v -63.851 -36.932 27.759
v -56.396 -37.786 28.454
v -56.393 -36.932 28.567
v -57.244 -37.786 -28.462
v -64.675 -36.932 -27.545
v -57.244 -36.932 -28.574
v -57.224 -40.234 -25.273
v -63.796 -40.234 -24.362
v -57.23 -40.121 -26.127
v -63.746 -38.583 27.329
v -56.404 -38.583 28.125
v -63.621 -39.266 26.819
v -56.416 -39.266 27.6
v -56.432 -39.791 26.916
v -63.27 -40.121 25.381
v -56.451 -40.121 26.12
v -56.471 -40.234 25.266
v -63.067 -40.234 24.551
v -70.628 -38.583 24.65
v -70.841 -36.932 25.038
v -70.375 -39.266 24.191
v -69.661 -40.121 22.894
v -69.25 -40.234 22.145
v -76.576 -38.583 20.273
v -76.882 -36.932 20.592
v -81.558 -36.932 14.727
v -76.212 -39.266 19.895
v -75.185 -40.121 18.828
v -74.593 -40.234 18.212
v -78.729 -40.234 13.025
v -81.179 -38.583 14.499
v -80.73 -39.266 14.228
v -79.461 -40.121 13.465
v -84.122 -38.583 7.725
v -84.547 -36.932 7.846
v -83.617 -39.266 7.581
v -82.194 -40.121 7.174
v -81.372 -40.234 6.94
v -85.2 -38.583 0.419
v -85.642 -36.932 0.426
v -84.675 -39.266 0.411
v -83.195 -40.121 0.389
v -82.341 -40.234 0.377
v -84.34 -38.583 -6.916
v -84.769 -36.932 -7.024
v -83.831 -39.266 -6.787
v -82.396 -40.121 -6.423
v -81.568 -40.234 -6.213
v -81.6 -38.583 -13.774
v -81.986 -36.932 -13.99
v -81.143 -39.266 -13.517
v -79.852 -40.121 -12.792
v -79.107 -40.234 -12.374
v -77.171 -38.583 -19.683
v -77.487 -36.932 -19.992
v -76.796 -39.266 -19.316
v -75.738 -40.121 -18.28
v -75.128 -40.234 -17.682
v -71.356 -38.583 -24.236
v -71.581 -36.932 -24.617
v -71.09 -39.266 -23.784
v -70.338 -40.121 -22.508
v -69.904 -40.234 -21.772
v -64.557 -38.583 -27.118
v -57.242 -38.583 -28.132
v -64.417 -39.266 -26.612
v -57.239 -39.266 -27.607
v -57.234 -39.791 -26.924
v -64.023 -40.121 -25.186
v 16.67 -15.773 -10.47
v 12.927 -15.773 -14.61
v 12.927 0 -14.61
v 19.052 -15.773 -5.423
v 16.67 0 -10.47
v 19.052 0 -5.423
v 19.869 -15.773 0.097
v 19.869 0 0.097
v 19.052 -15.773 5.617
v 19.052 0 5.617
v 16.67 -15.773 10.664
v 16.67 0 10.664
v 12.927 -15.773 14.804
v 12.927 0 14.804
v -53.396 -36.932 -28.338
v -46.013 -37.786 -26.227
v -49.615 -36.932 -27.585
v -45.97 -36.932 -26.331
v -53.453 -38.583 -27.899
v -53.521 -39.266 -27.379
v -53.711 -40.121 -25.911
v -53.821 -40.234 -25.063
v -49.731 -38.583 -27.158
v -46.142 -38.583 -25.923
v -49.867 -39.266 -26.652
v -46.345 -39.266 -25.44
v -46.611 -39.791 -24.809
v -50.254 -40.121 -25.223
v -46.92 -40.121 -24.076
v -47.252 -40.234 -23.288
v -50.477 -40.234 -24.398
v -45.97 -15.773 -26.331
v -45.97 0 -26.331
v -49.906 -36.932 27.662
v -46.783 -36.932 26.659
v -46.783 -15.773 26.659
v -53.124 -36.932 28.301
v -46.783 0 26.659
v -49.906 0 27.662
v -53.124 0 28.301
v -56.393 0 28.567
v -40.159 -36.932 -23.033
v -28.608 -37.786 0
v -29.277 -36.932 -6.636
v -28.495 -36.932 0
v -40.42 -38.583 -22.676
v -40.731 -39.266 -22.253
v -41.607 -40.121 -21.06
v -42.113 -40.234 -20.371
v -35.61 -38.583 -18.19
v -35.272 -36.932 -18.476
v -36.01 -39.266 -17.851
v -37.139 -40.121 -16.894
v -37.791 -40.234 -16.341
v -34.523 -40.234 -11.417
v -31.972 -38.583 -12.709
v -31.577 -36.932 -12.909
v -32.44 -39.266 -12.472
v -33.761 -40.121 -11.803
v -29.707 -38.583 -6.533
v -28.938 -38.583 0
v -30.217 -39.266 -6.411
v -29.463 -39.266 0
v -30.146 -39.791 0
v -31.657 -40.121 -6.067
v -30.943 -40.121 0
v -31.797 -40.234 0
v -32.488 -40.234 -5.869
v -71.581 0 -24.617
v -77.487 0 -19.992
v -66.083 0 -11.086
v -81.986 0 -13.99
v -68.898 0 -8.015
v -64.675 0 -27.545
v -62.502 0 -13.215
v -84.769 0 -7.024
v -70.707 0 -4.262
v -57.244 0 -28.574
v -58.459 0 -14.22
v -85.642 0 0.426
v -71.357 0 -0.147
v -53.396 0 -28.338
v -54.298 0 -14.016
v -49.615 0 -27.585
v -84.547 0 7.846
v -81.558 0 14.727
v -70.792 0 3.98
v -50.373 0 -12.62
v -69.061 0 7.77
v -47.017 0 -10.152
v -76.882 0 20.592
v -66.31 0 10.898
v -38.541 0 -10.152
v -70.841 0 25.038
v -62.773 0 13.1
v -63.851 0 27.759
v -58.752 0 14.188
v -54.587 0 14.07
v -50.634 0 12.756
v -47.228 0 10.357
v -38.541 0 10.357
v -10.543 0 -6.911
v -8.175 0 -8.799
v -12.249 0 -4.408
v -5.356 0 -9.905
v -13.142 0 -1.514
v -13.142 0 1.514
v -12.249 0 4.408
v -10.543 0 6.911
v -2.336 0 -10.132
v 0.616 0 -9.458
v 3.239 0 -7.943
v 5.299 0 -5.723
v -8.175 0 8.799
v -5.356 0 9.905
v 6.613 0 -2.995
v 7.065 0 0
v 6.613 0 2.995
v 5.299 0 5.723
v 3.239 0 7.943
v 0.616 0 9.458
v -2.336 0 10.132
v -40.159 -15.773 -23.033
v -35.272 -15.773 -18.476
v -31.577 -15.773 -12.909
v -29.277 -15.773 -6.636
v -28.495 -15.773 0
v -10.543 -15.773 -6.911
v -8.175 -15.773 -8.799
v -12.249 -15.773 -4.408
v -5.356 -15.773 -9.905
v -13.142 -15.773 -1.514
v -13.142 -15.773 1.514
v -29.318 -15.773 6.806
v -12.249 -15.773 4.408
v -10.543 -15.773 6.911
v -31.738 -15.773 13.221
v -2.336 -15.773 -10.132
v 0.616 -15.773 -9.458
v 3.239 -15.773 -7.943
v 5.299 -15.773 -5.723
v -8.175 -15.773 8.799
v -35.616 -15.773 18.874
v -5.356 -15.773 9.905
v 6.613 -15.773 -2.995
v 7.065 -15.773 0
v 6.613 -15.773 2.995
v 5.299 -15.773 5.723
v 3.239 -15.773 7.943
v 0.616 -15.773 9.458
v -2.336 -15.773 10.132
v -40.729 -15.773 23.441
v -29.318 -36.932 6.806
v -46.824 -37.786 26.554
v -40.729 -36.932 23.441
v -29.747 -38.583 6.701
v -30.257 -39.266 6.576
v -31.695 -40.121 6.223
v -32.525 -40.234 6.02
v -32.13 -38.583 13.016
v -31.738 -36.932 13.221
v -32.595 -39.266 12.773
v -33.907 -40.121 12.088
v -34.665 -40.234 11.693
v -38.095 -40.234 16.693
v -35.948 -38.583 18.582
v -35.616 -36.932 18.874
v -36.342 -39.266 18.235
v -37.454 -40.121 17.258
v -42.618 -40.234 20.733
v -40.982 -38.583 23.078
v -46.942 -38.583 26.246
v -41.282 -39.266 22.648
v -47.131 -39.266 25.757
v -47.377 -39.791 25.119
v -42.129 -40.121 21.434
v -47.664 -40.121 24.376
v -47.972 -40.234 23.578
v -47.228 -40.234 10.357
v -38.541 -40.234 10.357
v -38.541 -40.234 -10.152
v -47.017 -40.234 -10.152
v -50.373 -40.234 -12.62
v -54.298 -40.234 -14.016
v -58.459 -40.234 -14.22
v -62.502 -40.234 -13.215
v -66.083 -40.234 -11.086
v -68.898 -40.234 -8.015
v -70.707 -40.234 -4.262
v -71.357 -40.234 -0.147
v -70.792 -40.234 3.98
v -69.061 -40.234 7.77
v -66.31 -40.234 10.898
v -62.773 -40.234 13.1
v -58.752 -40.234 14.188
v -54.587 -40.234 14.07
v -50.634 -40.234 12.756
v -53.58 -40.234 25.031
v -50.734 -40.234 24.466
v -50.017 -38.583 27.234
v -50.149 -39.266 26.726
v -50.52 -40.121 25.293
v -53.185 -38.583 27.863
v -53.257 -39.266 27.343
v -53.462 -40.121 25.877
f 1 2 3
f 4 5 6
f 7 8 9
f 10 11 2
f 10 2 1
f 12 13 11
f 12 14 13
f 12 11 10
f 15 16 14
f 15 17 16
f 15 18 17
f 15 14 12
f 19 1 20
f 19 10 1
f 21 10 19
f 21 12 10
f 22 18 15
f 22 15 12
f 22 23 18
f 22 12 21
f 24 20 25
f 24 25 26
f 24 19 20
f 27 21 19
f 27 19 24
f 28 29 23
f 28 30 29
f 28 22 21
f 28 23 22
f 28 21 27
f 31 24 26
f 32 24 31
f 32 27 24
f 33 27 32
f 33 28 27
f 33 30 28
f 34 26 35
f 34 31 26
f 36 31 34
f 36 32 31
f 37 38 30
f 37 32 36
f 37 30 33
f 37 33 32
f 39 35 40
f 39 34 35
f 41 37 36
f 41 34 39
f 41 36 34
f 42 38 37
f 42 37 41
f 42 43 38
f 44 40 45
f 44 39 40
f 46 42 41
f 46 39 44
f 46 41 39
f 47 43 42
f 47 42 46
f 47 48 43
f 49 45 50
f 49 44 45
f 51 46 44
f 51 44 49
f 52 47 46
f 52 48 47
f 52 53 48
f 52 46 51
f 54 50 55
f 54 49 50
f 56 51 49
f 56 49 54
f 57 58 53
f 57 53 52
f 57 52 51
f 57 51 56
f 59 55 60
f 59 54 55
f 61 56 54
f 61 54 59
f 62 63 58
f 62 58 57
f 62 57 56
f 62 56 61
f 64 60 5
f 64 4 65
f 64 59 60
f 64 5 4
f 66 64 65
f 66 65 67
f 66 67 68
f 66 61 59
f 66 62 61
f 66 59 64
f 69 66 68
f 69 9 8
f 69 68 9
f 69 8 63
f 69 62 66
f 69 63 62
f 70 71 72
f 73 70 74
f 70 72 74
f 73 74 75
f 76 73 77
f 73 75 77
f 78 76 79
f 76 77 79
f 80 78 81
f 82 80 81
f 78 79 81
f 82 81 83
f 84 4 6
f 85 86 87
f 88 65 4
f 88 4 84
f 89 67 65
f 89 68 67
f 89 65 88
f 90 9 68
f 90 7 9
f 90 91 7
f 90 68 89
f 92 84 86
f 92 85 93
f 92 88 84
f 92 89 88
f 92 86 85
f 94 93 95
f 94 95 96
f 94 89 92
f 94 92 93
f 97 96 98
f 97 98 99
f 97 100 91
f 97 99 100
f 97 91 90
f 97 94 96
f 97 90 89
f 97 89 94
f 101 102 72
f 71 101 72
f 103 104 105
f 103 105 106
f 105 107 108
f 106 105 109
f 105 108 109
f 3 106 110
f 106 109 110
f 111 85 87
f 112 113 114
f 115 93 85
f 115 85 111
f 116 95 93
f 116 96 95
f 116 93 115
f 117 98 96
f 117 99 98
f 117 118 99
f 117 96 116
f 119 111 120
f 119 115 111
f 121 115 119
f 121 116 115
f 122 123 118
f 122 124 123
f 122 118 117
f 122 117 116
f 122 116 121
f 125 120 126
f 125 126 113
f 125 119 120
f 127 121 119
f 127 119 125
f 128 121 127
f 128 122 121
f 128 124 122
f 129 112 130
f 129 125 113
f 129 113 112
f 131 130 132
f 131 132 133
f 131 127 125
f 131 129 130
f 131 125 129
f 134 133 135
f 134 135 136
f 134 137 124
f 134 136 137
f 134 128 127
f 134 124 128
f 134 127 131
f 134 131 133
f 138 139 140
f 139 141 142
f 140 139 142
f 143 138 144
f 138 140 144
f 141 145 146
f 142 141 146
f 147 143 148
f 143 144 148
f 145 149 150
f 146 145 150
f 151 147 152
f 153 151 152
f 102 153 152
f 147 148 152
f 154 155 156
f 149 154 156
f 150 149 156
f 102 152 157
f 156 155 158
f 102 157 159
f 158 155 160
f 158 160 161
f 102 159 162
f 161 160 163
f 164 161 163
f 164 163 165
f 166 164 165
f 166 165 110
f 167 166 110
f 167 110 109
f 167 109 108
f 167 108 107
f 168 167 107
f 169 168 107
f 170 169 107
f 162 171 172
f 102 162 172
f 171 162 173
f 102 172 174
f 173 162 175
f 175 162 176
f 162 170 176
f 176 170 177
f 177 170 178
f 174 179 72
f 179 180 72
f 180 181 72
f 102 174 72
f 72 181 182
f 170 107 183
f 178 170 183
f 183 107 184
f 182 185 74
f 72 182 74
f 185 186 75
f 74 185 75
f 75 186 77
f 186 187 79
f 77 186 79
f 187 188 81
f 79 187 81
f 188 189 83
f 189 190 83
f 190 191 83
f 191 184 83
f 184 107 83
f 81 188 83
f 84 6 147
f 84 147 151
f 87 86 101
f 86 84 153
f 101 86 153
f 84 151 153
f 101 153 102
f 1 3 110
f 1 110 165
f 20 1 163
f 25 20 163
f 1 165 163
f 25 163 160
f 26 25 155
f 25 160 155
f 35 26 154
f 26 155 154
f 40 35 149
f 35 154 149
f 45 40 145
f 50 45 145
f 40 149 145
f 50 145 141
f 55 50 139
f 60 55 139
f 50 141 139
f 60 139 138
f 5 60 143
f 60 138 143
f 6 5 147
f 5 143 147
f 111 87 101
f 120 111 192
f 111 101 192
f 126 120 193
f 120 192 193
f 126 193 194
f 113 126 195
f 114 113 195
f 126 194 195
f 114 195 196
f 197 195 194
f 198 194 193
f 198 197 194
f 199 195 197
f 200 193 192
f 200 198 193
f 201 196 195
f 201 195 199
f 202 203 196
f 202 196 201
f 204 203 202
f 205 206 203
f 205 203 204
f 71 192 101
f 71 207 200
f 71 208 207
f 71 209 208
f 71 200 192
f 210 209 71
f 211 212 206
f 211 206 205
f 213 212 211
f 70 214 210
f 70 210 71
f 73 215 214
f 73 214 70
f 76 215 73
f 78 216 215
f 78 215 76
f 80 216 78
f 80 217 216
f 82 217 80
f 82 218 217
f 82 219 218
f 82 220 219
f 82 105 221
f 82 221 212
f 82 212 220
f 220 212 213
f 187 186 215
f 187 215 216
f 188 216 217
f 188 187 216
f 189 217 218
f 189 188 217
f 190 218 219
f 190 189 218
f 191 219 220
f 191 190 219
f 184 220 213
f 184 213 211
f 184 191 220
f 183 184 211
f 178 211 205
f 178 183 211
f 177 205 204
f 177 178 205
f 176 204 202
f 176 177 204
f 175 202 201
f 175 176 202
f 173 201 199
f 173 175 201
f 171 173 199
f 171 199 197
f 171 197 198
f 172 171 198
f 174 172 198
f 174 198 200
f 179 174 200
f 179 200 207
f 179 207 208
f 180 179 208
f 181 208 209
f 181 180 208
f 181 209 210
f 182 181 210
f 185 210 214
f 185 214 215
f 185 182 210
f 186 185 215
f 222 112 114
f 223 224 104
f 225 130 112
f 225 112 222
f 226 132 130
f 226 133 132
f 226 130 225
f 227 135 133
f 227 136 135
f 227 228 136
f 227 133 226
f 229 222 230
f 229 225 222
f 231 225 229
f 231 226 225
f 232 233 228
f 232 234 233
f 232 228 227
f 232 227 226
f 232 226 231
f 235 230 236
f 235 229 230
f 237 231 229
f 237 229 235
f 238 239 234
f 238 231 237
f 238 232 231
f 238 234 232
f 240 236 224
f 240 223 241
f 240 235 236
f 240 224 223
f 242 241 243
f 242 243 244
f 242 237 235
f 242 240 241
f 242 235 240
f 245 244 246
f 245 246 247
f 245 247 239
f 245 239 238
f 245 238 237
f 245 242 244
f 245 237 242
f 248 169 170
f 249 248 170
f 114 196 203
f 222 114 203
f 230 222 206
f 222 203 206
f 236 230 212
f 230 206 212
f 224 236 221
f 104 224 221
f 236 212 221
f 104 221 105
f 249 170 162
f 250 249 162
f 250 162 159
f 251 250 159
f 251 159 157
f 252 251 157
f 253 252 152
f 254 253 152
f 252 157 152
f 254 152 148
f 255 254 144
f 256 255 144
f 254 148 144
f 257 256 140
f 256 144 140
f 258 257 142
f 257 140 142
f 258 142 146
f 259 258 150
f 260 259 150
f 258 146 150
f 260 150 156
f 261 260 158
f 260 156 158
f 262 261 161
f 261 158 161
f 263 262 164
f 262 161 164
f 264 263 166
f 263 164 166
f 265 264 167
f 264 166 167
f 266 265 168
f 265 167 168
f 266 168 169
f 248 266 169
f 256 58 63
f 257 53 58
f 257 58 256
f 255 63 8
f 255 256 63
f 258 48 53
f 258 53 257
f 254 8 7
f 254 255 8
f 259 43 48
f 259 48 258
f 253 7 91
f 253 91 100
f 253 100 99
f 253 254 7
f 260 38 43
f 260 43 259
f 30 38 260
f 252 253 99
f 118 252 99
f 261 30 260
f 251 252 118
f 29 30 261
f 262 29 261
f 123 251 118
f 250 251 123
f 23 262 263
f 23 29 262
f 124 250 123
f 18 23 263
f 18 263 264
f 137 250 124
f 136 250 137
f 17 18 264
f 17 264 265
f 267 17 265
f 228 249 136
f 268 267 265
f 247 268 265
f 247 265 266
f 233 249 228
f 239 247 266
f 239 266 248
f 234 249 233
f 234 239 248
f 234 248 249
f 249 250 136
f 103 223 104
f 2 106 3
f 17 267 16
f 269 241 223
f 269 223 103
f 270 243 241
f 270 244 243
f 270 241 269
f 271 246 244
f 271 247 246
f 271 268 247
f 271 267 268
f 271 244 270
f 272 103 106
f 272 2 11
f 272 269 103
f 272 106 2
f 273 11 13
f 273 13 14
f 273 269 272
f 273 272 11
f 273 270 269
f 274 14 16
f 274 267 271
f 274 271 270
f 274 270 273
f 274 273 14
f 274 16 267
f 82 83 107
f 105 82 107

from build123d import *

# Parameters (mm, degrees)
F1_DEPTH = 40.2336
F0_R     = 10.16
F2_DEPTH = 15.7734
F3_R     = 3.302


with BuildPart() as f1:
    # F0 (on Front) → F1 (new body)
    with BuildSketch(Plane.XZ):
        with BuildLine():
            ThreePointArc((-46.7830288695, 26.6589681412), (-51.5056559342, 28.027918724), (-56.3930534915, 28.5669708617))
            Line((-56.3930534915, 28.5669708617), (-46.7830288695, 26.6589681412))
        make_face()
        with BuildLine():
            Line((-45.9697033865, -26.3306877774), (-57.2444129947, -28.5744701634))
            ThreePointArc((-57.2444129947, -28.5744701634), (-51.4930580564, -28.0254145609), (-45.9697033865, -26.3306877774))
        make_face()
        with BuildLine():
            Line((-46.7830288695, 26.6589681412), (-56.3930534915, 28.5669708617))
            ThreePointArc((-56.3930534915, 28.5669708617), (-85.6422307581, 0.4256962659), (-57.2444129947, -28.5744701634))
            Line((-57.2444129947, -28.5744701634), (-45.9697033865, -26.3306877774))
            ThreePointArc((-45.9697033865, -26.3306877774), (-33.2614425676, -15.8007621125), (-28.4954018406, 0))
            ThreePointArc((-28.4954018406, 0), (-33.506740117, 16.1642961856), (-46.7830288695, 26.6589681412))
        make_face()
        with BuildLine():
            ThreePointArc((-47.01702871, -10.1519626155), (-71.3571450466, -0.1470537858), (-47.2281253638, 10.3567490075))
            Line((-47.2281253638, 10.3567490075), (-38.5411018406, 10.3567490075))
            Line((-38.5411018406, 10.3567490075), (-38.5411018406, -10.1519626155))
            Line((-38.5411018406, -10.1519626155), (-47.01702871, -10.1519626155))
        make_face(mode=Mode.SUBTRACT)
    extrude(amount=F1_DEPTH)

    # F0 (on Front) → F2 (join)
    with BuildSketch(Plane.XZ):
        with BuildLine():
            Line((12.9274923096, 14.8038646076), (-46.7830288695, 26.6589681412))
            ThreePointArc((-46.7830288695, 26.6589681412), (-33.506740117, 16.1642961856), (-28.4954018406, 0))
            ThreePointArc((-28.4954018406, 0), (-33.2614425676, -15.8007621125), (-45.9697033865, -26.3306877774))
            Line((-45.9697033865, -26.3306877774), (12.9274923096, -14.6095441843))
            ThreePointArc((12.9274923096, -14.6095441843), (19.8690099187, 0.0971602116), (12.9274923096, 14.8038646076))
        make_face()
        with Locations((-3.0954018406, 0)):
            Circle(F0_R, mode=Mode.SUBTRACT)
    extrude(amount=F2_DEPTH)

    # F3
    f3_edges = [f1.edges().sort_by_distance(p)[0] for p in [
        (-57.74775, -40.2336, -28.566971),
    ]]
    fillet(f3_edges, radius=F3_R)


solid = f1.part
